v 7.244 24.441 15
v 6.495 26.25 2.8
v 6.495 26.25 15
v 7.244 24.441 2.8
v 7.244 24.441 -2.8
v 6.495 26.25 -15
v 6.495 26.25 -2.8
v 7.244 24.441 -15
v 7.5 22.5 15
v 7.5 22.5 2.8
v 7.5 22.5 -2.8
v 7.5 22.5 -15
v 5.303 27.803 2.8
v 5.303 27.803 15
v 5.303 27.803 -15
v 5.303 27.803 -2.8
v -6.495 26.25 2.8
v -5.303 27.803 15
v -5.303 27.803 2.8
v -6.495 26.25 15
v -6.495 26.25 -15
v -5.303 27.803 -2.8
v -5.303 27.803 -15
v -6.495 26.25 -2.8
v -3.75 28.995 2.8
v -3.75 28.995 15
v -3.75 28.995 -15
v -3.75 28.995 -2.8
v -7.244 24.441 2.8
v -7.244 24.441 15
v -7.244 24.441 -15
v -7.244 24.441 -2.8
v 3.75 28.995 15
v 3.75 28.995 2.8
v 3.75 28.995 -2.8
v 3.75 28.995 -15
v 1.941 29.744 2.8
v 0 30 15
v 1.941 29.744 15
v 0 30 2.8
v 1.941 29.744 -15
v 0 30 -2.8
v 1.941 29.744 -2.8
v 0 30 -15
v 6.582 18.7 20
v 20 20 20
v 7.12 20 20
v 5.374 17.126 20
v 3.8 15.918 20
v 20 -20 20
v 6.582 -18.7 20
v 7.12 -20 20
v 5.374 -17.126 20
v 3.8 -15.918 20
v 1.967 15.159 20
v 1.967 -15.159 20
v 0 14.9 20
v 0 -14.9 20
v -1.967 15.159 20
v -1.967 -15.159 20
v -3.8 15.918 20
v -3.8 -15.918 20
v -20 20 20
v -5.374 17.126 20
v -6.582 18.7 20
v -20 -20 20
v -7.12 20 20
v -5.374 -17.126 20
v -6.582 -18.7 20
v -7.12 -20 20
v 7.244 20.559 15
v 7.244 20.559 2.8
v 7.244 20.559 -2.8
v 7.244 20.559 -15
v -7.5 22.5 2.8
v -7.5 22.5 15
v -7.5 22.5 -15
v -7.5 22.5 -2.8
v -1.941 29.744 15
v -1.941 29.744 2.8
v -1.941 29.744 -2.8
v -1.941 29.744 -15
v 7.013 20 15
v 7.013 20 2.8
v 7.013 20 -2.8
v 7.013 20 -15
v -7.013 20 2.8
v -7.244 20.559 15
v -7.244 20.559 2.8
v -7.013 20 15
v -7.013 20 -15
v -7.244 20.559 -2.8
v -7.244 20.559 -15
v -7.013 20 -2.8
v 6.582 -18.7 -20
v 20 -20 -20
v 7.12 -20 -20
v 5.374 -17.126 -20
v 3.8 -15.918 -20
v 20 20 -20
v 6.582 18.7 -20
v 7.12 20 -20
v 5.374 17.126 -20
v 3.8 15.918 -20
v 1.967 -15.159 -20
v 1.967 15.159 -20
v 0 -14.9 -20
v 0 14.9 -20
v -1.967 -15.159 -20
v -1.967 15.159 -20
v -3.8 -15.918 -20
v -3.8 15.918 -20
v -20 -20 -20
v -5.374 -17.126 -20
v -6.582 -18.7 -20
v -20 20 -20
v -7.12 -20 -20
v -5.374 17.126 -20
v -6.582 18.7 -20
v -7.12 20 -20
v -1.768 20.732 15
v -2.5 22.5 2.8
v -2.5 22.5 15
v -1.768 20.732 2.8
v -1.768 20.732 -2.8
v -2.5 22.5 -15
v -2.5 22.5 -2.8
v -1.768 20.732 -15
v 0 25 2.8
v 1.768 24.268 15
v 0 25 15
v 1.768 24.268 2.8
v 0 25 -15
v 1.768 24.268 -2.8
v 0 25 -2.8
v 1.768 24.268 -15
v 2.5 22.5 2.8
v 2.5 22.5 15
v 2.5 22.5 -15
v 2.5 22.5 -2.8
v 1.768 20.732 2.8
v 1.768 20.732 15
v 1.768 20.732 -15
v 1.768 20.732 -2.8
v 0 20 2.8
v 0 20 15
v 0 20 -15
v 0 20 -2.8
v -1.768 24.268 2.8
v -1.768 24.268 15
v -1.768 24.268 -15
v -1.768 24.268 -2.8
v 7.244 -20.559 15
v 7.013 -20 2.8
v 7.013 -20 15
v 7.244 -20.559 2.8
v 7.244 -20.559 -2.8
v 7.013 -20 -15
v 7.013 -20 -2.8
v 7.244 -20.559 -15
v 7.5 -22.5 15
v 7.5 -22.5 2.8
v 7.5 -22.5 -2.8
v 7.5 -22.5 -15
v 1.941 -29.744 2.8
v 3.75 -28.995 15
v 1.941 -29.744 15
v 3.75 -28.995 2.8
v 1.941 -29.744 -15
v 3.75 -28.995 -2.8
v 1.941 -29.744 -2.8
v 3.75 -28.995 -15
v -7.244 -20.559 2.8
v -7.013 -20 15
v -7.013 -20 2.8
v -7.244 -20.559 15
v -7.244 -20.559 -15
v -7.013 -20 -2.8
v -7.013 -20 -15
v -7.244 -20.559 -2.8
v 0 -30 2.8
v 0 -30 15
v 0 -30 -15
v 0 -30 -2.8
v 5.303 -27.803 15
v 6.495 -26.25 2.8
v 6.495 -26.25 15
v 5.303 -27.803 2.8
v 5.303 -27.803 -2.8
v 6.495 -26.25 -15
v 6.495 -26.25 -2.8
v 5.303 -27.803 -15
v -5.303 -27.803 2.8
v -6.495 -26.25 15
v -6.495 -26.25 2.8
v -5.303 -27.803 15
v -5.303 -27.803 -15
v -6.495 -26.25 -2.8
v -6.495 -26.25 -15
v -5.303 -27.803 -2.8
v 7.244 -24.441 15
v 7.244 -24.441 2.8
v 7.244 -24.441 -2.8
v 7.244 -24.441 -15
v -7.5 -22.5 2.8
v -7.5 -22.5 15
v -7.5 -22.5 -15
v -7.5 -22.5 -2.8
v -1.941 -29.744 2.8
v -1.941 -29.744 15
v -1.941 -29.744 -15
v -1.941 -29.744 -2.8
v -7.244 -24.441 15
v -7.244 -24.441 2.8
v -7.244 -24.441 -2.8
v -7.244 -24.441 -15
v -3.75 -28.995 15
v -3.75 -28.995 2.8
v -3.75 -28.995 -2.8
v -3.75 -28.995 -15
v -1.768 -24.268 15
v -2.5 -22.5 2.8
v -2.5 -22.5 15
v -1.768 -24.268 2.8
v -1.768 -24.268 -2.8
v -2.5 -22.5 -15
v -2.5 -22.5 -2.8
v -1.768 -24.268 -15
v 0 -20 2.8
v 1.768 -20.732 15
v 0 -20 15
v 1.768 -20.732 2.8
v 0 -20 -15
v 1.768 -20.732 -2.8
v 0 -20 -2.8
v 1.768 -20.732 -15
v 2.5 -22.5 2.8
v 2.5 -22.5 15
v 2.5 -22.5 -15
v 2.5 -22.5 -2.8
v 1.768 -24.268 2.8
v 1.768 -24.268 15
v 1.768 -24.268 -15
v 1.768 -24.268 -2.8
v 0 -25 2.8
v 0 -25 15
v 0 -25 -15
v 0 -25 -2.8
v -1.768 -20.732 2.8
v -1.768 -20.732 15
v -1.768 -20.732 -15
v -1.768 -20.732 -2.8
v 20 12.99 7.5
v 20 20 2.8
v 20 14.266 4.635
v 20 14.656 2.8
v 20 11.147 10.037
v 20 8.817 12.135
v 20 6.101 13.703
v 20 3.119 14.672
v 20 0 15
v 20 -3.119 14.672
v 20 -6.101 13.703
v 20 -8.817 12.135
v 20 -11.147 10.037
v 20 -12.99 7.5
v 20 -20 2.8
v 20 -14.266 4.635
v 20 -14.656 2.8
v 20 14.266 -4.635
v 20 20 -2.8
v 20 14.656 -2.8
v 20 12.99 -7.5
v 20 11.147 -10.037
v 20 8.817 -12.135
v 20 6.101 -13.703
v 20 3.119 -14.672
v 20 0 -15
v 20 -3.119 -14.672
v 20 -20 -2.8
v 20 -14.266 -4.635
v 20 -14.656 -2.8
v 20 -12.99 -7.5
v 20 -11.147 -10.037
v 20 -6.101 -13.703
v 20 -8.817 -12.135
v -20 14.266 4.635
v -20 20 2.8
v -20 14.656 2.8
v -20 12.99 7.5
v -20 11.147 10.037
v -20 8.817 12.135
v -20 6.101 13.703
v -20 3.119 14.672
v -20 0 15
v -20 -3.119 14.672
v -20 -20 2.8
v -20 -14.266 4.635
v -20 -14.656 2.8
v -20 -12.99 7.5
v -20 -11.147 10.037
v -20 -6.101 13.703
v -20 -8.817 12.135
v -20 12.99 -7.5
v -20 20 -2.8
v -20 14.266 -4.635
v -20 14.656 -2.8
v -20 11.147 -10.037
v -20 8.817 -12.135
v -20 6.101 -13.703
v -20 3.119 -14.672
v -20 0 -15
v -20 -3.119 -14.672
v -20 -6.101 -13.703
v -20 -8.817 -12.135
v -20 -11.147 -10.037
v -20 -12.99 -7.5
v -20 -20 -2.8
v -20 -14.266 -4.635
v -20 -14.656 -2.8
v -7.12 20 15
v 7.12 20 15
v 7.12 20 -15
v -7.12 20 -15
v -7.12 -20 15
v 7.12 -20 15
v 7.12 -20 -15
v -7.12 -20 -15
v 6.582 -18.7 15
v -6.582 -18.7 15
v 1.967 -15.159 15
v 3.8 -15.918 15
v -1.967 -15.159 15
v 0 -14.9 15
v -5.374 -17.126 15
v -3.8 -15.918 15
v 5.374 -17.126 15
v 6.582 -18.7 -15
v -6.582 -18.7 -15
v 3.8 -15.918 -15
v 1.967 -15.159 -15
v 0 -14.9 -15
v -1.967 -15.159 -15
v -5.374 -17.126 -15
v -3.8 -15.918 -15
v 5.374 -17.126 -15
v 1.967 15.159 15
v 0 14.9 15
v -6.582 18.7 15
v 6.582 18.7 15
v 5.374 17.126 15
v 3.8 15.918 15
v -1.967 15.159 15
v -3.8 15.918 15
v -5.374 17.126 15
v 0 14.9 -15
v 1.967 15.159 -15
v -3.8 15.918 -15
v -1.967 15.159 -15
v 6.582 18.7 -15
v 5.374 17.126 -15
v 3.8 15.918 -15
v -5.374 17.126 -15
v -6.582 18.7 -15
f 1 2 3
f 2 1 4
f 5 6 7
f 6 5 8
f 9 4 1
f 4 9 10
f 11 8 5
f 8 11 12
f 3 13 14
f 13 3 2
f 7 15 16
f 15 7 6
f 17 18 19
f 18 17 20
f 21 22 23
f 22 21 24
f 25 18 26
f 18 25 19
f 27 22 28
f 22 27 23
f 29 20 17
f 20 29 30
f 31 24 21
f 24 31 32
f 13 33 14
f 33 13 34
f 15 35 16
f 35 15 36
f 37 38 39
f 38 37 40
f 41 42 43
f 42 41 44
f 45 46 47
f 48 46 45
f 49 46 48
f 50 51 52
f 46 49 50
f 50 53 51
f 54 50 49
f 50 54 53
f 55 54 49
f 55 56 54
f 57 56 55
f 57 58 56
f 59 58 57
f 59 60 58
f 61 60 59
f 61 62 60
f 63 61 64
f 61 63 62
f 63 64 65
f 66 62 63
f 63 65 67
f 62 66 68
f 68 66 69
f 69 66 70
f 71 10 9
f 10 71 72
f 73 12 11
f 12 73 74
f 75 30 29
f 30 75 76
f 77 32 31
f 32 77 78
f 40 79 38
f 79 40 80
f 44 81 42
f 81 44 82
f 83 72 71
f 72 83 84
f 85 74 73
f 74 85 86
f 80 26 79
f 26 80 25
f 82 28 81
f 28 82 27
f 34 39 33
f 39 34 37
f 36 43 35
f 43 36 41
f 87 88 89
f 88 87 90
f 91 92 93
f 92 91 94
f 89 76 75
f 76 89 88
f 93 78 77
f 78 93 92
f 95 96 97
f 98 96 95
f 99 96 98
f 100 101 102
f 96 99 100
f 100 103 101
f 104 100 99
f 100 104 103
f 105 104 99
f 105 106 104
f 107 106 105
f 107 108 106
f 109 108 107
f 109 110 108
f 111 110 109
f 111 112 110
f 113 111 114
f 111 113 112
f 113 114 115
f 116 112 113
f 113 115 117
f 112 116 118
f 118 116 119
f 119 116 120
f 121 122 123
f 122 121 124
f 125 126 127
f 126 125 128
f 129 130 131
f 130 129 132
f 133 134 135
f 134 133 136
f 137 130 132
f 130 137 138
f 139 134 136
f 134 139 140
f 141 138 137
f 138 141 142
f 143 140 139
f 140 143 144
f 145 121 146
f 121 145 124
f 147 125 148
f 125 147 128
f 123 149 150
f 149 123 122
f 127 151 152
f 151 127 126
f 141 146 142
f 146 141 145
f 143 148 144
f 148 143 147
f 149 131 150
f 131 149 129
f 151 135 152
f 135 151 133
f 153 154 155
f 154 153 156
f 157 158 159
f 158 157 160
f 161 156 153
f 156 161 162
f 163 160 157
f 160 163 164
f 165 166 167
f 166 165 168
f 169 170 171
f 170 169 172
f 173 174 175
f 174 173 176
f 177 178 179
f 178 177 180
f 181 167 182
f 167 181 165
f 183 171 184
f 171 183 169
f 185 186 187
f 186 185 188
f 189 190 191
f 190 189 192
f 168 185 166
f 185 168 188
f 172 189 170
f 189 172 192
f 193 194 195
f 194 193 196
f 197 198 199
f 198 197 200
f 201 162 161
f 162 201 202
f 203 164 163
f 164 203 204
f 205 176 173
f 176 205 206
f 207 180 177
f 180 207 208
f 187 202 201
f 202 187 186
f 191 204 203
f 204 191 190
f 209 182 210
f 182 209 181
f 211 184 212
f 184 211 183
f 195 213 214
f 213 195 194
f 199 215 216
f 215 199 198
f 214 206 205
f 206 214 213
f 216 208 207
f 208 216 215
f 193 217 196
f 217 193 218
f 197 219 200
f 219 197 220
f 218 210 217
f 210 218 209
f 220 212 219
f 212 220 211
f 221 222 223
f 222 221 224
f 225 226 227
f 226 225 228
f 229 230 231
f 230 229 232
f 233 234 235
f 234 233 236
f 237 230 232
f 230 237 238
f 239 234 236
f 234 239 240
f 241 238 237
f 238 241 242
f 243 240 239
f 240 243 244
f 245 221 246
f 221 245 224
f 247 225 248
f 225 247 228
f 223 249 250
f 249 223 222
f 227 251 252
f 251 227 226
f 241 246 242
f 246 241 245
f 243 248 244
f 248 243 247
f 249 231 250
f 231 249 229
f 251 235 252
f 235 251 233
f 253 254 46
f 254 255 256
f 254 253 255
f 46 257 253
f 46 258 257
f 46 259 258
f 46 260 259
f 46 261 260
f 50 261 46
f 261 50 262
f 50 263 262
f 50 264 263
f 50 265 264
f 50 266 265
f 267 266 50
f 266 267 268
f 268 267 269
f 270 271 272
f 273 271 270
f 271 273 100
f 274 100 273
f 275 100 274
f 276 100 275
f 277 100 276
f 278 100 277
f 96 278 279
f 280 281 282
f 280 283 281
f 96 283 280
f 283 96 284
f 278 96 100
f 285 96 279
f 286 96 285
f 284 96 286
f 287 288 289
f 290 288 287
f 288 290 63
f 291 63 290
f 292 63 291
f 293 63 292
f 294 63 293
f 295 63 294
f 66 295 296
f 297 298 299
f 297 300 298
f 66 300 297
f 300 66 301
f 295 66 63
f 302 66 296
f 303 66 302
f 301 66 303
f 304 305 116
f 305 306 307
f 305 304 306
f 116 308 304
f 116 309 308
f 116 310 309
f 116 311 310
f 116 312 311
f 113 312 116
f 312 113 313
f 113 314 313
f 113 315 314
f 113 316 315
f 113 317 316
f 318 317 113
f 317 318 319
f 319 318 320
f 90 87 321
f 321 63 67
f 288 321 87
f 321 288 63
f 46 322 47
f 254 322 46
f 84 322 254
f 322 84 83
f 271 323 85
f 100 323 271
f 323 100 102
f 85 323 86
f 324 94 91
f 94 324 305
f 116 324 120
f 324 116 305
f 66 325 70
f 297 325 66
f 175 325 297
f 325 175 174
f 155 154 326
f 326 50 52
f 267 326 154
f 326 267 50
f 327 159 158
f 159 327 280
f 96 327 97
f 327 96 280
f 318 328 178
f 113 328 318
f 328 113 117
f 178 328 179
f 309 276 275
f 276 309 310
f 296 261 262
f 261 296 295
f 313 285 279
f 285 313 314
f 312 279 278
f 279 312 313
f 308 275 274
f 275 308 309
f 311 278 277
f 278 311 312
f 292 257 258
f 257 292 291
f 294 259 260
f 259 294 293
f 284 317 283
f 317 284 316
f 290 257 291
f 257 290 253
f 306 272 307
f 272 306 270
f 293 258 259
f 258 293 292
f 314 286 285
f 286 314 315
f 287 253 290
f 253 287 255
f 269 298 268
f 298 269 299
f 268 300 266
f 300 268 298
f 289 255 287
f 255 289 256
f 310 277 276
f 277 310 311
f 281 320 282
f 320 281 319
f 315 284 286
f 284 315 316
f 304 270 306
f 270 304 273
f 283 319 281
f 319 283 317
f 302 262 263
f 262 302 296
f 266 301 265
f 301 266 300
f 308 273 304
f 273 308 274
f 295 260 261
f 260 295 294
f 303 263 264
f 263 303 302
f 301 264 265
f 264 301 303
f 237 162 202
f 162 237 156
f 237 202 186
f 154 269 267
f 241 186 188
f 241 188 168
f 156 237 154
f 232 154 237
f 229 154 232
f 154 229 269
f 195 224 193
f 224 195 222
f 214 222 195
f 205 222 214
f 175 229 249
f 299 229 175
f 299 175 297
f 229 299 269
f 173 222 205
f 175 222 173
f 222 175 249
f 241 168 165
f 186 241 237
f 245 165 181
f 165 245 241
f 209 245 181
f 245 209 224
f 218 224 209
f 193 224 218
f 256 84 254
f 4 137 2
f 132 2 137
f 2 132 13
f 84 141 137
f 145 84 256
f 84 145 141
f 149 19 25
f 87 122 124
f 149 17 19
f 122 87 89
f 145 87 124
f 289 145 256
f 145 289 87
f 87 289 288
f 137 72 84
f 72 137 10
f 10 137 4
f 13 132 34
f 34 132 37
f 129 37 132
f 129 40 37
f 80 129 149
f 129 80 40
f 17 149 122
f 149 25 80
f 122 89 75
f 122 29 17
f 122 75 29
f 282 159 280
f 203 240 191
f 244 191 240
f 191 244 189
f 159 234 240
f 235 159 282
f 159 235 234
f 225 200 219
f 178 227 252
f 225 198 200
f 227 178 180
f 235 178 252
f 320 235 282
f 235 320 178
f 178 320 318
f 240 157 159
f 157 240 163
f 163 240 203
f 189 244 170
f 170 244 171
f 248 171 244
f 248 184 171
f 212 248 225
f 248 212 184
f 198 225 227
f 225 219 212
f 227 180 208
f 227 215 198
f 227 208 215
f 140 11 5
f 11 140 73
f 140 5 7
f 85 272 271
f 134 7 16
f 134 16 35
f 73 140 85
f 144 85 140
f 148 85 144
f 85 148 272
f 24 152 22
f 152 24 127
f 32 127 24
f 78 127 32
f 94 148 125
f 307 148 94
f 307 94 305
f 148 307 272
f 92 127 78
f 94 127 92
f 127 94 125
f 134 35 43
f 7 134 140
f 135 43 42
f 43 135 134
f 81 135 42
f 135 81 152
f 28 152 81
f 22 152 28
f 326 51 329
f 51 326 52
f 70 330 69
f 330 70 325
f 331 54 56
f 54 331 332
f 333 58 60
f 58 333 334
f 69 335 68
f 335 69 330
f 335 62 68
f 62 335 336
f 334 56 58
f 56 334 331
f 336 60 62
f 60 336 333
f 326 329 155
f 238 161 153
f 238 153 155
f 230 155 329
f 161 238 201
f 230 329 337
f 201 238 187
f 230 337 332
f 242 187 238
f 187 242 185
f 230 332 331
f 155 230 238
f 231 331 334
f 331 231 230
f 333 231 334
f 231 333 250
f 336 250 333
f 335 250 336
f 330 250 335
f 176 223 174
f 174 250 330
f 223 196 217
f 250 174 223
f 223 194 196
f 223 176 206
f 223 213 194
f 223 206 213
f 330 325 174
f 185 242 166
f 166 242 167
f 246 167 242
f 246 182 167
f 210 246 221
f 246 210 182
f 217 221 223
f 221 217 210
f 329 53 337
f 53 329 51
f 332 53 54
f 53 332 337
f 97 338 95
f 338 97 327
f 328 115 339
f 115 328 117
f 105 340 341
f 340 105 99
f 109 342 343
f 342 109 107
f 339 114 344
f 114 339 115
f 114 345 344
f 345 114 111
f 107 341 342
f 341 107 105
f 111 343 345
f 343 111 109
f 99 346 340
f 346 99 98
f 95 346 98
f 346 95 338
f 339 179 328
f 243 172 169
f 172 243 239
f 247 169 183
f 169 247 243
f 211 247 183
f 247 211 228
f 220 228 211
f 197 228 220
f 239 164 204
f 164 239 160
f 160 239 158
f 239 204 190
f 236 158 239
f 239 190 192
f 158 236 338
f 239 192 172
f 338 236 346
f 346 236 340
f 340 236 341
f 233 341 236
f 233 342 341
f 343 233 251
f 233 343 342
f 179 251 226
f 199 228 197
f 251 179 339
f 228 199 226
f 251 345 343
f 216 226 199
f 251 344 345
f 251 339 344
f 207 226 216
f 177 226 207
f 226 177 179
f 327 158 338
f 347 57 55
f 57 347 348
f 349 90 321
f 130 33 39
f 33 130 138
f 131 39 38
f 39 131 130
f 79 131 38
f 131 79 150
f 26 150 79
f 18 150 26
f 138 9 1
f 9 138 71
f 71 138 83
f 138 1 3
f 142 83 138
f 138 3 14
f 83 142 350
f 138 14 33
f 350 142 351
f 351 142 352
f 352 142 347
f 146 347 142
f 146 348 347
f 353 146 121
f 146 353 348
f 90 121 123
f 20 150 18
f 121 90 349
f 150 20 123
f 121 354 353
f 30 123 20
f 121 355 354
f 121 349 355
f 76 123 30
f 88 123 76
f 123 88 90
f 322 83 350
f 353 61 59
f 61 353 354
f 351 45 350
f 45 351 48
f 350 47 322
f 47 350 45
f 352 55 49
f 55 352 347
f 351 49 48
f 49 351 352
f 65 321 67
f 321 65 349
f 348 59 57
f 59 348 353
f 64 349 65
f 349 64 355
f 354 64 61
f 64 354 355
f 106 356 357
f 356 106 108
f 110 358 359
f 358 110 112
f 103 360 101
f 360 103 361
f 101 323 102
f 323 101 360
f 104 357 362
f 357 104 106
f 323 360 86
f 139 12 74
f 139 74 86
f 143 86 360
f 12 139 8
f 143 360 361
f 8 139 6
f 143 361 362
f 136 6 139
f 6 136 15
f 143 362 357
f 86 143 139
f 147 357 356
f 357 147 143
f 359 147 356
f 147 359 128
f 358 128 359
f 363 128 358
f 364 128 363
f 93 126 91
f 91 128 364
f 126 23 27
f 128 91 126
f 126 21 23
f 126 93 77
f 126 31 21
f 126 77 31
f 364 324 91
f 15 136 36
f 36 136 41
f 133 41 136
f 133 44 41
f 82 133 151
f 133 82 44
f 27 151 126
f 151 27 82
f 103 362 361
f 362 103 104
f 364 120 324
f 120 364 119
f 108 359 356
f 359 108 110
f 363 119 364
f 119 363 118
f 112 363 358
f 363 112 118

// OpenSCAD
tube_diameter = 28;
space_margin = 1;
thickness = 5;
screw_diameter = 5;
screw_head_thickness = 5;

a = tube_diameter + 2* space_margin +2*thickness;
difference(){
	union(){
		//Main part
		cube(size=[a,a,a], center = true);
		
		//Screw tube
		translate([0, a/2+screw_diameter/2,0]) difference(){
			cylinder(r = screw_diameter/2+thickness, h = a, center=				true);
			cylinder(r = screw_diameter/2, h = a, center=true);
		}
		//Second screw tube
		translate([0, -a/2-screw_diameter/2,0]) difference(){
			cylinder(r = screw_diameter/2+thickness, h = a, center=				true);
			cylinder(r = screw_diameter/2, h = a, center=true);

		}
	}
	rotate([0,90,0])  cylinder(r=tube_diameter/2. + space_margin, h= 2*a, center = true);
   cube(size =[2*a, 2*a,tube_diameter/5.], center = true);
	translate([0,-a/2-screw_diameter/2,a/2]) cylinder(r = screw_diameter/2+thickness+0.1, h = 2*screw_head_thickness, center=				true);
	translate([0,-a/2-screw_diameter/2,-a/2]) cylinder(r = screw_diameter/2+thickness+0.1, h = 2*screw_head_thickness, center=				true);
	translate([0,+a/2+screw_diameter/2,a/2]) cylinder(r = screw_diameter/2+thickness+0.1, h = 2*screw_head_thickness, center=				true);
	translate([0,+a/2+screw_diameter/2,-a/2]) cylinder(r = screw_diameter/2+thickness+0.1, h = 2*screw_head_thickness, center=				true);
}
